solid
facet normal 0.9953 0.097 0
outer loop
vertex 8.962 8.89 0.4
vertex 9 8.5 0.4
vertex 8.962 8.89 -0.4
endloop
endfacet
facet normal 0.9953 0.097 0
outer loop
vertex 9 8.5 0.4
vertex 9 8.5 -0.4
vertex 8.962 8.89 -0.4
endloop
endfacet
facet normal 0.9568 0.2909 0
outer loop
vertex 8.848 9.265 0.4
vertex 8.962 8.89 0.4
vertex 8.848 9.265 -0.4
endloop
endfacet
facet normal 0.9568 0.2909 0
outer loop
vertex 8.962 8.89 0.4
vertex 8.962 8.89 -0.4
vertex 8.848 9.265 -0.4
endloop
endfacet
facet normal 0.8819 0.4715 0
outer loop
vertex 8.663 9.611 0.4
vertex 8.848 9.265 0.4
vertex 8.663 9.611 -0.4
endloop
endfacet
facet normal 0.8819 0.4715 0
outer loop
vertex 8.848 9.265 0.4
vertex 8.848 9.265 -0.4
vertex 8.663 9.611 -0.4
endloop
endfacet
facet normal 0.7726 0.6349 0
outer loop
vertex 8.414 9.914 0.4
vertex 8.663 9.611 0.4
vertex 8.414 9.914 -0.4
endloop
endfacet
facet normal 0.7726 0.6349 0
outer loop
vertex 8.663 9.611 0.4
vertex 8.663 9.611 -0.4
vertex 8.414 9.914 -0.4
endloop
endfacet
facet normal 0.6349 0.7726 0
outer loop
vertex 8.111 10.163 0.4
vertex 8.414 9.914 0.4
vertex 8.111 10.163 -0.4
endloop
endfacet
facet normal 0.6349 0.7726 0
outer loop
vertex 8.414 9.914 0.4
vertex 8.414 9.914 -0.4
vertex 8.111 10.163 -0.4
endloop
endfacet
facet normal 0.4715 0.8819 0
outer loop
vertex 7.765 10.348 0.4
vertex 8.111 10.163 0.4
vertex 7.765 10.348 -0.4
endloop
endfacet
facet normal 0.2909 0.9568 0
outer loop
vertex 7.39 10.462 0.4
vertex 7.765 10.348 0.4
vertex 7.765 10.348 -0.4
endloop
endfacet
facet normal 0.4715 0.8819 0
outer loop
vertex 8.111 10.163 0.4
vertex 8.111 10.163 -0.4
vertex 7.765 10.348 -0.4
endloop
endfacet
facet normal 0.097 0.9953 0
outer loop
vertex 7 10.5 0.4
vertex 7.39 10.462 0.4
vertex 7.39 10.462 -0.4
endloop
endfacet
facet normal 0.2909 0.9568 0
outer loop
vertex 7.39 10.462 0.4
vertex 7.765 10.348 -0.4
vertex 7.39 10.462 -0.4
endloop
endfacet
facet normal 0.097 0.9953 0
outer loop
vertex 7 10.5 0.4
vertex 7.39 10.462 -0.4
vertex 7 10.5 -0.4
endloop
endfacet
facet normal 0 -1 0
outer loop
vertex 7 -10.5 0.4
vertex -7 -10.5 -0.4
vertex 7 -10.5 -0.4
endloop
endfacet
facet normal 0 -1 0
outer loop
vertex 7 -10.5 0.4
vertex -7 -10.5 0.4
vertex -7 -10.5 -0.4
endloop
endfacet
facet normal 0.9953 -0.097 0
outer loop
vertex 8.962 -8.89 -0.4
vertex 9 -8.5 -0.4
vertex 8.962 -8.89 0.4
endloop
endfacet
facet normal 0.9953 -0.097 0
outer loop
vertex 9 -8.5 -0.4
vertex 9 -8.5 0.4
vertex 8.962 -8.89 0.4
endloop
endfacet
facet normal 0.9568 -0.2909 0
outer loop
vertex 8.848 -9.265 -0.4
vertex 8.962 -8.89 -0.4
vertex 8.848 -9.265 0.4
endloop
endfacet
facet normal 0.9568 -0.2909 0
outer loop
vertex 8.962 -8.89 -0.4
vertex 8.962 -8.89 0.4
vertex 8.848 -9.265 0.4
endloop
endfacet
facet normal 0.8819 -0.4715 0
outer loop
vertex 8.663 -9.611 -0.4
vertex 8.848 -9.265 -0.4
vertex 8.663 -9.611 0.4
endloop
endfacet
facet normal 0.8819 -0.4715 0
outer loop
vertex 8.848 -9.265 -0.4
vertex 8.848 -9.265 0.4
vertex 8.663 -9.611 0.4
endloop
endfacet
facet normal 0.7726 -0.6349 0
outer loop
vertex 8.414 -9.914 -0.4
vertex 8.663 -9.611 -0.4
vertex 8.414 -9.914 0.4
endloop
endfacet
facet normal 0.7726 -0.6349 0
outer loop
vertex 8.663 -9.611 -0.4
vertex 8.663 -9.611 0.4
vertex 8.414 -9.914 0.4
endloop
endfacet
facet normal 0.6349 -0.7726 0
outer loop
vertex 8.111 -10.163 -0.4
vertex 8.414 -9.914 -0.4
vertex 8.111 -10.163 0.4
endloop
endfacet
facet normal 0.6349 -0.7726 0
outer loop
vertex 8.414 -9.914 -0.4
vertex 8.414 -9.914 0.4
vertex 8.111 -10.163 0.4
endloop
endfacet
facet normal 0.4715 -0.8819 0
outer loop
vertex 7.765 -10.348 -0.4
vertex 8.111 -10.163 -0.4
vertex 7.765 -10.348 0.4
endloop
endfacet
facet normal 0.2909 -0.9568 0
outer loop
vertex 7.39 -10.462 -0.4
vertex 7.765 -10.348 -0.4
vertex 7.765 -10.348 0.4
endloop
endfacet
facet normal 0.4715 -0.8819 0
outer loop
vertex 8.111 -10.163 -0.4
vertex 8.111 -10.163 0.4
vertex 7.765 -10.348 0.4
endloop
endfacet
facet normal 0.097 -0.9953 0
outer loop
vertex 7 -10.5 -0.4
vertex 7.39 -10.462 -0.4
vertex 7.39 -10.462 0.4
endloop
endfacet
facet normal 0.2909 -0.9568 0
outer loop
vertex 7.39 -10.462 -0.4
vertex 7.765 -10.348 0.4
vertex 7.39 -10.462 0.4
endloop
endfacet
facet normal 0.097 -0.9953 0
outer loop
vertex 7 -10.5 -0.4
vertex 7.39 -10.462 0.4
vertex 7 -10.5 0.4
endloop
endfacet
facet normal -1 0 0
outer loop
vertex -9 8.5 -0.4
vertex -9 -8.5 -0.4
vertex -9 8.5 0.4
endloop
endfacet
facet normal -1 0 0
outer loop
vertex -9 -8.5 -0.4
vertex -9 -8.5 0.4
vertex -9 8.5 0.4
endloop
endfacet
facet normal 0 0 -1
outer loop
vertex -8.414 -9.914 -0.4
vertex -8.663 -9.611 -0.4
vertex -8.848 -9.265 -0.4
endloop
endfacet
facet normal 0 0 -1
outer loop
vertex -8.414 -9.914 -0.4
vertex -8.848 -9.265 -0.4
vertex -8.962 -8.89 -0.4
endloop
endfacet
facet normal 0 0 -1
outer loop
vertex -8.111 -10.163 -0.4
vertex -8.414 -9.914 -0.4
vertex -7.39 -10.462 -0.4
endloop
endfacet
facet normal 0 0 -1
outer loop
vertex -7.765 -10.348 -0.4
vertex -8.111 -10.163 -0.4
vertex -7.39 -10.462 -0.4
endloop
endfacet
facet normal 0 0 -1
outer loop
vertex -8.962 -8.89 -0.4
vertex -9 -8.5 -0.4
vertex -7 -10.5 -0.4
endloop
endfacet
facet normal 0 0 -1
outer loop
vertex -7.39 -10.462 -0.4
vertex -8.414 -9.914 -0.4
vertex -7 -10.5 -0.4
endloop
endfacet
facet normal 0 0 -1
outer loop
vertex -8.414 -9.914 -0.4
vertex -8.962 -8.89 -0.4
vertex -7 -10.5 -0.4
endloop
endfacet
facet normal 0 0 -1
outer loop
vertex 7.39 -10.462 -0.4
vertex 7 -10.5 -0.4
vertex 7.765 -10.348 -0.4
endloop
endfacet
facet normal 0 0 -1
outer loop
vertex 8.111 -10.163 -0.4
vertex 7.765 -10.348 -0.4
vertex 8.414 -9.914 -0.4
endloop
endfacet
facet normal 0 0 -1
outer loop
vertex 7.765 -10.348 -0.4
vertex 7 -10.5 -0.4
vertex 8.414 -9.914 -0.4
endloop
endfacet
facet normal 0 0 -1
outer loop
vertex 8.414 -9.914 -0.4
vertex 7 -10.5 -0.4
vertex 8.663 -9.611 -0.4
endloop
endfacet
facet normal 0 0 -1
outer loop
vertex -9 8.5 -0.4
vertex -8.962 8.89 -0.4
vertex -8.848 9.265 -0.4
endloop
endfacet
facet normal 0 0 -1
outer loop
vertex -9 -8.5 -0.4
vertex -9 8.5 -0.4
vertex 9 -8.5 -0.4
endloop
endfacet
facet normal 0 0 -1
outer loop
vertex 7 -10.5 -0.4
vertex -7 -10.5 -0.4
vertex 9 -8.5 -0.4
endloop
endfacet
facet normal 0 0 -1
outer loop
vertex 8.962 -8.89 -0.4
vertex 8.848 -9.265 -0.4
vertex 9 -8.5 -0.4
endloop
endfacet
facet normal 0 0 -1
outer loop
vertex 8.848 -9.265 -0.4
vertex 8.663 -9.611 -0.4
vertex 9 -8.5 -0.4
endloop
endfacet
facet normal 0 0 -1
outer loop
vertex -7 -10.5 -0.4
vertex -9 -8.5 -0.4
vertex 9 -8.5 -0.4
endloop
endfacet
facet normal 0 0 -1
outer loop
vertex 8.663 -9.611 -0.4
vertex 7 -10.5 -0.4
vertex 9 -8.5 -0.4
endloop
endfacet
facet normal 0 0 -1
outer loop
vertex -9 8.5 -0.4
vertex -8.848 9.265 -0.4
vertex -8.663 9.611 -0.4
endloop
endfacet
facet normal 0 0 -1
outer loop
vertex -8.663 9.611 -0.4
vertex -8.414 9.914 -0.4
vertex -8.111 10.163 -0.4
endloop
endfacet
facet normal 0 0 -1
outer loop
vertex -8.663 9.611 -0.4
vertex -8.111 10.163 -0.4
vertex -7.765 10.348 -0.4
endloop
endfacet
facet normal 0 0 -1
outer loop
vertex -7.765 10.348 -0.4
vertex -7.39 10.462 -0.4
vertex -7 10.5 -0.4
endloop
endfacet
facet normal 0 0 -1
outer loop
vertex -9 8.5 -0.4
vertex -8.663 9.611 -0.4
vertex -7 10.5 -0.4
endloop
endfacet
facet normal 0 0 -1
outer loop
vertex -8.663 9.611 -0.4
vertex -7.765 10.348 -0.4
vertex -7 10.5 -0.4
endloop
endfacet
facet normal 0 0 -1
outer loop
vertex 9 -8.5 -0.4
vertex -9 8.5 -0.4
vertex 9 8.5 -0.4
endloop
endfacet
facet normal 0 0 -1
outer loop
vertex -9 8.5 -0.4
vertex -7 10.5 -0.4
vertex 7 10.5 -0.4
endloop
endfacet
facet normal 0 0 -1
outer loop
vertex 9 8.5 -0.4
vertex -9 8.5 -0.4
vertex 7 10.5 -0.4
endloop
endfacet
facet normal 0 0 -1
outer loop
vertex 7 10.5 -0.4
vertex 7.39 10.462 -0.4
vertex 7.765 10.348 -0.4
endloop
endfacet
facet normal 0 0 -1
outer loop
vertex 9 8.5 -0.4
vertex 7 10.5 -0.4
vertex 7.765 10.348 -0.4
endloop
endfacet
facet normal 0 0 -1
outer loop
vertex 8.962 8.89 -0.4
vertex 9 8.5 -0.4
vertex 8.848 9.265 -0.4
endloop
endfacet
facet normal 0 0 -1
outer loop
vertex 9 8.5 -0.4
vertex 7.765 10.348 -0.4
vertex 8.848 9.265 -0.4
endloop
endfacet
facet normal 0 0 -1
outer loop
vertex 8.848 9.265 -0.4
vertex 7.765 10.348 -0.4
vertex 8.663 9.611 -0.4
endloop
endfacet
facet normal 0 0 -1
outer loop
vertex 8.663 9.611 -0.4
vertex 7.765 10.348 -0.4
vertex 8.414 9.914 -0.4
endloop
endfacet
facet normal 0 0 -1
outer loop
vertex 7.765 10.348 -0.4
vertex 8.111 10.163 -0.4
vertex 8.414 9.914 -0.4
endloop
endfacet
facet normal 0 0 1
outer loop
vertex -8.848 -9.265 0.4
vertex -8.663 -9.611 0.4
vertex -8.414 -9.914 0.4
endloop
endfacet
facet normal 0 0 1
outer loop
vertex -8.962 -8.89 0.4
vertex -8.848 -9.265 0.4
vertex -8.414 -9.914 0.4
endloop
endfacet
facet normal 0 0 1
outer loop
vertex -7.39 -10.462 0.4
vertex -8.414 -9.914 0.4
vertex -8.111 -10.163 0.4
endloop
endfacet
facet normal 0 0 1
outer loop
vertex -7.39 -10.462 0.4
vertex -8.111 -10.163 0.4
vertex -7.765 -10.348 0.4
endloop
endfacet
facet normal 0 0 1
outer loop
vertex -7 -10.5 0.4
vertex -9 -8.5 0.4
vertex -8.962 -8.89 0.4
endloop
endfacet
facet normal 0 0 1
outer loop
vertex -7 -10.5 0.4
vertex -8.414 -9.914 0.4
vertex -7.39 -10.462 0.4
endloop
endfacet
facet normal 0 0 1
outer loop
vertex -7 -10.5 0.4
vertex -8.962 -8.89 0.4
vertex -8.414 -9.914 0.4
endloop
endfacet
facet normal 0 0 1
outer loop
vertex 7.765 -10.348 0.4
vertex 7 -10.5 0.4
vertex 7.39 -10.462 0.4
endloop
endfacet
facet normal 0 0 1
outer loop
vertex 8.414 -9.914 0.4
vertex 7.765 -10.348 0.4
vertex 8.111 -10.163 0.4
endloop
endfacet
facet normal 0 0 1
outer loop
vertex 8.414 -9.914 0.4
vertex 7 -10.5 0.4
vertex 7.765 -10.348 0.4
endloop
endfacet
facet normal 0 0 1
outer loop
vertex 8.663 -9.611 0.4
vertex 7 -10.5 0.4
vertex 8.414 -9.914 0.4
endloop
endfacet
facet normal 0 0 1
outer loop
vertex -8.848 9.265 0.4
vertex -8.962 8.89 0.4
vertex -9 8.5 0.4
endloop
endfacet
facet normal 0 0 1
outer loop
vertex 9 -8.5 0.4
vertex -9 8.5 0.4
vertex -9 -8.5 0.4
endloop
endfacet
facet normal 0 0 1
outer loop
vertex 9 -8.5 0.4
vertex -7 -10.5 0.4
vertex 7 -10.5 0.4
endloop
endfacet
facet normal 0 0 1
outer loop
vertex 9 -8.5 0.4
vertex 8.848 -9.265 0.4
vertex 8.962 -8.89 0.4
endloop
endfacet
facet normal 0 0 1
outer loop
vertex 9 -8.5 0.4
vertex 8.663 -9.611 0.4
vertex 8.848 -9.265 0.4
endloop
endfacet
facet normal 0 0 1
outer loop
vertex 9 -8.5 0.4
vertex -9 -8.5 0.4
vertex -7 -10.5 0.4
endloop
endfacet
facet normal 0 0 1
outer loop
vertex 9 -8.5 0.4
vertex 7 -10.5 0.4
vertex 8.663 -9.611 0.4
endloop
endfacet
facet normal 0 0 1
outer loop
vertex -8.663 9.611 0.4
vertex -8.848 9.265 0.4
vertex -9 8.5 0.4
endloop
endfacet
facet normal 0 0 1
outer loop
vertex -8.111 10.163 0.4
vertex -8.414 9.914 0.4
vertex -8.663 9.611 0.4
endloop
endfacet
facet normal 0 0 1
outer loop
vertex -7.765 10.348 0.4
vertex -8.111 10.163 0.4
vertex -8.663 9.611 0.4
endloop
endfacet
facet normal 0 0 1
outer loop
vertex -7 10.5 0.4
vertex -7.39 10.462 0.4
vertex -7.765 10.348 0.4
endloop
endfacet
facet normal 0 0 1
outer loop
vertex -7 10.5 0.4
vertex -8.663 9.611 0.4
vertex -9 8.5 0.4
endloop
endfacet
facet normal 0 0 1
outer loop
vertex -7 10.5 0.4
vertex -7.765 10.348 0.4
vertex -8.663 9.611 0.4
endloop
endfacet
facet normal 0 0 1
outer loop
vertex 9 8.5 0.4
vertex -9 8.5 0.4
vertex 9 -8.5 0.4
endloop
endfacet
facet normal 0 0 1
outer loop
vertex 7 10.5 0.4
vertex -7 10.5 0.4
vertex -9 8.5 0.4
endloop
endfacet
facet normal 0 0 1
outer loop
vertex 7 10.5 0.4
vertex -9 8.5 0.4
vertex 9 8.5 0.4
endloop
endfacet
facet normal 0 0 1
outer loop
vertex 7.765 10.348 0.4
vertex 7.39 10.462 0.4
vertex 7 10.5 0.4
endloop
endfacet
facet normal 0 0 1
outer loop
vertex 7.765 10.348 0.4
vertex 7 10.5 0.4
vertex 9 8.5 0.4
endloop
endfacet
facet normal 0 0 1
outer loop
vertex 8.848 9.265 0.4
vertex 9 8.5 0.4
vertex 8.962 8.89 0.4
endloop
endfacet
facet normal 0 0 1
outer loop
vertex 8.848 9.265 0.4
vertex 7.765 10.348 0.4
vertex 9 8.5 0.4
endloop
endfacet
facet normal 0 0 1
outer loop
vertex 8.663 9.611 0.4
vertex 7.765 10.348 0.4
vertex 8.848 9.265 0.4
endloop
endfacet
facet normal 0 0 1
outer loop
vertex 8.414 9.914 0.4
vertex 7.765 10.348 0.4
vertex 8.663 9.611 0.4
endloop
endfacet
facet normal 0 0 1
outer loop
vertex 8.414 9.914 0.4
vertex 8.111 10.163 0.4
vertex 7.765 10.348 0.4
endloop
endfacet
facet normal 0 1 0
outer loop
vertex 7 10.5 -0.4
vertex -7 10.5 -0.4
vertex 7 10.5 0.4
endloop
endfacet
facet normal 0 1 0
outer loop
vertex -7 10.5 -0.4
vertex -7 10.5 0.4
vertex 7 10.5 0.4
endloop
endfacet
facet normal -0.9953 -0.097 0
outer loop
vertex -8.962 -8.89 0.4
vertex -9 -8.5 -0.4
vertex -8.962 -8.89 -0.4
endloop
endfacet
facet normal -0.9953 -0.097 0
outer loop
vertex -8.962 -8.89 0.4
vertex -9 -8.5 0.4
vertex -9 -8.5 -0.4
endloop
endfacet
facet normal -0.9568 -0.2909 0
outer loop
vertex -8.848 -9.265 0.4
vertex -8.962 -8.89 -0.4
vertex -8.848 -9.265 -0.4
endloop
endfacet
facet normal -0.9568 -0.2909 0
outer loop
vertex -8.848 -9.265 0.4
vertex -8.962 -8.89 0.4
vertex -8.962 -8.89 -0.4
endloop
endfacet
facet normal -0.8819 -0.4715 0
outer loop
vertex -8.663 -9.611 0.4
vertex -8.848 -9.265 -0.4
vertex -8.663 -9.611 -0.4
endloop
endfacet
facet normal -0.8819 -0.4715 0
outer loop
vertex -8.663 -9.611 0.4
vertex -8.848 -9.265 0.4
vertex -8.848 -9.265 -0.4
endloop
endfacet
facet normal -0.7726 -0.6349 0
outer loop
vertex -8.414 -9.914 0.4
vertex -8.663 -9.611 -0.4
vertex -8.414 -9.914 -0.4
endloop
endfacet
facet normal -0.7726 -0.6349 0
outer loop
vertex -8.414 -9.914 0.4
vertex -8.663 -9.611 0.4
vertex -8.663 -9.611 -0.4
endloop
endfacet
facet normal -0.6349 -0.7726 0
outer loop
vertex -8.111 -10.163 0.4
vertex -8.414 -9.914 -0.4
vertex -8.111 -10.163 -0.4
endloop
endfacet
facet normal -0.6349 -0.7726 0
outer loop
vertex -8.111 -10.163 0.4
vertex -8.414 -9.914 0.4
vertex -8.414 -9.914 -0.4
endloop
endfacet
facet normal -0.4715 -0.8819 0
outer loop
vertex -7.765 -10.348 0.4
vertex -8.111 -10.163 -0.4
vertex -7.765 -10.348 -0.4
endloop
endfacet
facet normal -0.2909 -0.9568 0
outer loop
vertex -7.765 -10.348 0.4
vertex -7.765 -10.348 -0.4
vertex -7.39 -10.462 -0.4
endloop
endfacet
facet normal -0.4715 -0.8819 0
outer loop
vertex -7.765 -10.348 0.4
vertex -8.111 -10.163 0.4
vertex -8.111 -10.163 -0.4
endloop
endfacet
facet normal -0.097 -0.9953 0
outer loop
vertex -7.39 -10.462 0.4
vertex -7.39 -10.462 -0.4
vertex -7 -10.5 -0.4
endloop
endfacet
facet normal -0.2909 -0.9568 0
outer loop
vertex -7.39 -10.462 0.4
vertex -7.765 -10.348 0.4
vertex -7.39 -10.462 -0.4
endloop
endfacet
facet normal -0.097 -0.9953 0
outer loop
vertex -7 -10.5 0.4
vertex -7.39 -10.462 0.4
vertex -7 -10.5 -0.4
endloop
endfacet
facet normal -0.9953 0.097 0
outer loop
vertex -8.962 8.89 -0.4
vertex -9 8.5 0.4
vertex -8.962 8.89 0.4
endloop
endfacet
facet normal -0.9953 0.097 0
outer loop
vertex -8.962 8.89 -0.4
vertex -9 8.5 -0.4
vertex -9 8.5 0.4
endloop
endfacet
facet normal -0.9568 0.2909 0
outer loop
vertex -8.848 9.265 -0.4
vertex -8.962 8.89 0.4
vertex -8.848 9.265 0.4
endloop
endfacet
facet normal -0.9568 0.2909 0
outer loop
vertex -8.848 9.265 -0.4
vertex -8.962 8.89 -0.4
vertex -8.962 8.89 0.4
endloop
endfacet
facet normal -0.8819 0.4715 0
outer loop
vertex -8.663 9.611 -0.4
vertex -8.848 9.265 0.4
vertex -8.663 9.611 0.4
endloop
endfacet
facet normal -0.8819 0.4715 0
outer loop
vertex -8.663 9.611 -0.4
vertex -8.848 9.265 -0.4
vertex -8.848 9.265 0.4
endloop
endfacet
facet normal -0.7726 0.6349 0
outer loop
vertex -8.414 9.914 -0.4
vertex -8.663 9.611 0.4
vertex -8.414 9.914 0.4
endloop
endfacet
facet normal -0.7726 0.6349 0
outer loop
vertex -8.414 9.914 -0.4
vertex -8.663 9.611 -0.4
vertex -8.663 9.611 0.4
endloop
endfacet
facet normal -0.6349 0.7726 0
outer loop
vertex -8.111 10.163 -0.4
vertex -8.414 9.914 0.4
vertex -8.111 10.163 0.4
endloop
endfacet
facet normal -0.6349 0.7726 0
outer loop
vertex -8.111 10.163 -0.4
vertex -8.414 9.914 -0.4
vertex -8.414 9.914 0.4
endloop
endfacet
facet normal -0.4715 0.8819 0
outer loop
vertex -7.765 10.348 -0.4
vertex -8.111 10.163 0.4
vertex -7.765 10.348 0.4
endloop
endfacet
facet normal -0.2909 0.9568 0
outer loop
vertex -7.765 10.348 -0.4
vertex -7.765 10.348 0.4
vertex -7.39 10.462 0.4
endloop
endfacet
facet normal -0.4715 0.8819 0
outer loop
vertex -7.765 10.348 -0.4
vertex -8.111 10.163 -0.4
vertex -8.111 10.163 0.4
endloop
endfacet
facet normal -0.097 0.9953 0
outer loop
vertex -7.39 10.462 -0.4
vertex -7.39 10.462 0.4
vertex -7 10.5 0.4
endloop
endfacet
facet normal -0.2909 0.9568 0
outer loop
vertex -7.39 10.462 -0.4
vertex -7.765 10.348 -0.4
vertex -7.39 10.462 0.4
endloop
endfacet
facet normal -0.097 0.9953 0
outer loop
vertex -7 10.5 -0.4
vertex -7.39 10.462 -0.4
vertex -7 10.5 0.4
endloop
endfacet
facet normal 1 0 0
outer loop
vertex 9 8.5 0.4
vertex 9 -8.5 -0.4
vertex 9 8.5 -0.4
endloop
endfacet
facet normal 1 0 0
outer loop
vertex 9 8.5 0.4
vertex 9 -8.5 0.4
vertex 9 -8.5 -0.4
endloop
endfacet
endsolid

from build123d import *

# Parameters (mm, degrees)
SKETCH_1_W      = 18
SKETCH_1_H      = 21
EXTRUDE_1_DEPTH = 0.4
FILLET_1_R      = 2


with BuildPart() as part:
    # Эскиз1 → Бобышка-Вытянуть1 (new body, symmetric)
    with BuildSketch(Plane.XY):
        Rectangle(SKETCH_1_W, SKETCH_1_H)
    extrude(amount=EXTRUDE_1_DEPTH, both=True)

    # Скругление1
    fillet_1_edges = [part.edges().sort_by_distance(p)[0] for p in [
        (9, -10.5, 0),
        (-9, -10.5, 0),
        (-9, 10.5, 0),
        (9, 10.5, 0),
    ]]
    fillet(fillet_1_edges, radius=FILLET_1_R)


solid = part.part
